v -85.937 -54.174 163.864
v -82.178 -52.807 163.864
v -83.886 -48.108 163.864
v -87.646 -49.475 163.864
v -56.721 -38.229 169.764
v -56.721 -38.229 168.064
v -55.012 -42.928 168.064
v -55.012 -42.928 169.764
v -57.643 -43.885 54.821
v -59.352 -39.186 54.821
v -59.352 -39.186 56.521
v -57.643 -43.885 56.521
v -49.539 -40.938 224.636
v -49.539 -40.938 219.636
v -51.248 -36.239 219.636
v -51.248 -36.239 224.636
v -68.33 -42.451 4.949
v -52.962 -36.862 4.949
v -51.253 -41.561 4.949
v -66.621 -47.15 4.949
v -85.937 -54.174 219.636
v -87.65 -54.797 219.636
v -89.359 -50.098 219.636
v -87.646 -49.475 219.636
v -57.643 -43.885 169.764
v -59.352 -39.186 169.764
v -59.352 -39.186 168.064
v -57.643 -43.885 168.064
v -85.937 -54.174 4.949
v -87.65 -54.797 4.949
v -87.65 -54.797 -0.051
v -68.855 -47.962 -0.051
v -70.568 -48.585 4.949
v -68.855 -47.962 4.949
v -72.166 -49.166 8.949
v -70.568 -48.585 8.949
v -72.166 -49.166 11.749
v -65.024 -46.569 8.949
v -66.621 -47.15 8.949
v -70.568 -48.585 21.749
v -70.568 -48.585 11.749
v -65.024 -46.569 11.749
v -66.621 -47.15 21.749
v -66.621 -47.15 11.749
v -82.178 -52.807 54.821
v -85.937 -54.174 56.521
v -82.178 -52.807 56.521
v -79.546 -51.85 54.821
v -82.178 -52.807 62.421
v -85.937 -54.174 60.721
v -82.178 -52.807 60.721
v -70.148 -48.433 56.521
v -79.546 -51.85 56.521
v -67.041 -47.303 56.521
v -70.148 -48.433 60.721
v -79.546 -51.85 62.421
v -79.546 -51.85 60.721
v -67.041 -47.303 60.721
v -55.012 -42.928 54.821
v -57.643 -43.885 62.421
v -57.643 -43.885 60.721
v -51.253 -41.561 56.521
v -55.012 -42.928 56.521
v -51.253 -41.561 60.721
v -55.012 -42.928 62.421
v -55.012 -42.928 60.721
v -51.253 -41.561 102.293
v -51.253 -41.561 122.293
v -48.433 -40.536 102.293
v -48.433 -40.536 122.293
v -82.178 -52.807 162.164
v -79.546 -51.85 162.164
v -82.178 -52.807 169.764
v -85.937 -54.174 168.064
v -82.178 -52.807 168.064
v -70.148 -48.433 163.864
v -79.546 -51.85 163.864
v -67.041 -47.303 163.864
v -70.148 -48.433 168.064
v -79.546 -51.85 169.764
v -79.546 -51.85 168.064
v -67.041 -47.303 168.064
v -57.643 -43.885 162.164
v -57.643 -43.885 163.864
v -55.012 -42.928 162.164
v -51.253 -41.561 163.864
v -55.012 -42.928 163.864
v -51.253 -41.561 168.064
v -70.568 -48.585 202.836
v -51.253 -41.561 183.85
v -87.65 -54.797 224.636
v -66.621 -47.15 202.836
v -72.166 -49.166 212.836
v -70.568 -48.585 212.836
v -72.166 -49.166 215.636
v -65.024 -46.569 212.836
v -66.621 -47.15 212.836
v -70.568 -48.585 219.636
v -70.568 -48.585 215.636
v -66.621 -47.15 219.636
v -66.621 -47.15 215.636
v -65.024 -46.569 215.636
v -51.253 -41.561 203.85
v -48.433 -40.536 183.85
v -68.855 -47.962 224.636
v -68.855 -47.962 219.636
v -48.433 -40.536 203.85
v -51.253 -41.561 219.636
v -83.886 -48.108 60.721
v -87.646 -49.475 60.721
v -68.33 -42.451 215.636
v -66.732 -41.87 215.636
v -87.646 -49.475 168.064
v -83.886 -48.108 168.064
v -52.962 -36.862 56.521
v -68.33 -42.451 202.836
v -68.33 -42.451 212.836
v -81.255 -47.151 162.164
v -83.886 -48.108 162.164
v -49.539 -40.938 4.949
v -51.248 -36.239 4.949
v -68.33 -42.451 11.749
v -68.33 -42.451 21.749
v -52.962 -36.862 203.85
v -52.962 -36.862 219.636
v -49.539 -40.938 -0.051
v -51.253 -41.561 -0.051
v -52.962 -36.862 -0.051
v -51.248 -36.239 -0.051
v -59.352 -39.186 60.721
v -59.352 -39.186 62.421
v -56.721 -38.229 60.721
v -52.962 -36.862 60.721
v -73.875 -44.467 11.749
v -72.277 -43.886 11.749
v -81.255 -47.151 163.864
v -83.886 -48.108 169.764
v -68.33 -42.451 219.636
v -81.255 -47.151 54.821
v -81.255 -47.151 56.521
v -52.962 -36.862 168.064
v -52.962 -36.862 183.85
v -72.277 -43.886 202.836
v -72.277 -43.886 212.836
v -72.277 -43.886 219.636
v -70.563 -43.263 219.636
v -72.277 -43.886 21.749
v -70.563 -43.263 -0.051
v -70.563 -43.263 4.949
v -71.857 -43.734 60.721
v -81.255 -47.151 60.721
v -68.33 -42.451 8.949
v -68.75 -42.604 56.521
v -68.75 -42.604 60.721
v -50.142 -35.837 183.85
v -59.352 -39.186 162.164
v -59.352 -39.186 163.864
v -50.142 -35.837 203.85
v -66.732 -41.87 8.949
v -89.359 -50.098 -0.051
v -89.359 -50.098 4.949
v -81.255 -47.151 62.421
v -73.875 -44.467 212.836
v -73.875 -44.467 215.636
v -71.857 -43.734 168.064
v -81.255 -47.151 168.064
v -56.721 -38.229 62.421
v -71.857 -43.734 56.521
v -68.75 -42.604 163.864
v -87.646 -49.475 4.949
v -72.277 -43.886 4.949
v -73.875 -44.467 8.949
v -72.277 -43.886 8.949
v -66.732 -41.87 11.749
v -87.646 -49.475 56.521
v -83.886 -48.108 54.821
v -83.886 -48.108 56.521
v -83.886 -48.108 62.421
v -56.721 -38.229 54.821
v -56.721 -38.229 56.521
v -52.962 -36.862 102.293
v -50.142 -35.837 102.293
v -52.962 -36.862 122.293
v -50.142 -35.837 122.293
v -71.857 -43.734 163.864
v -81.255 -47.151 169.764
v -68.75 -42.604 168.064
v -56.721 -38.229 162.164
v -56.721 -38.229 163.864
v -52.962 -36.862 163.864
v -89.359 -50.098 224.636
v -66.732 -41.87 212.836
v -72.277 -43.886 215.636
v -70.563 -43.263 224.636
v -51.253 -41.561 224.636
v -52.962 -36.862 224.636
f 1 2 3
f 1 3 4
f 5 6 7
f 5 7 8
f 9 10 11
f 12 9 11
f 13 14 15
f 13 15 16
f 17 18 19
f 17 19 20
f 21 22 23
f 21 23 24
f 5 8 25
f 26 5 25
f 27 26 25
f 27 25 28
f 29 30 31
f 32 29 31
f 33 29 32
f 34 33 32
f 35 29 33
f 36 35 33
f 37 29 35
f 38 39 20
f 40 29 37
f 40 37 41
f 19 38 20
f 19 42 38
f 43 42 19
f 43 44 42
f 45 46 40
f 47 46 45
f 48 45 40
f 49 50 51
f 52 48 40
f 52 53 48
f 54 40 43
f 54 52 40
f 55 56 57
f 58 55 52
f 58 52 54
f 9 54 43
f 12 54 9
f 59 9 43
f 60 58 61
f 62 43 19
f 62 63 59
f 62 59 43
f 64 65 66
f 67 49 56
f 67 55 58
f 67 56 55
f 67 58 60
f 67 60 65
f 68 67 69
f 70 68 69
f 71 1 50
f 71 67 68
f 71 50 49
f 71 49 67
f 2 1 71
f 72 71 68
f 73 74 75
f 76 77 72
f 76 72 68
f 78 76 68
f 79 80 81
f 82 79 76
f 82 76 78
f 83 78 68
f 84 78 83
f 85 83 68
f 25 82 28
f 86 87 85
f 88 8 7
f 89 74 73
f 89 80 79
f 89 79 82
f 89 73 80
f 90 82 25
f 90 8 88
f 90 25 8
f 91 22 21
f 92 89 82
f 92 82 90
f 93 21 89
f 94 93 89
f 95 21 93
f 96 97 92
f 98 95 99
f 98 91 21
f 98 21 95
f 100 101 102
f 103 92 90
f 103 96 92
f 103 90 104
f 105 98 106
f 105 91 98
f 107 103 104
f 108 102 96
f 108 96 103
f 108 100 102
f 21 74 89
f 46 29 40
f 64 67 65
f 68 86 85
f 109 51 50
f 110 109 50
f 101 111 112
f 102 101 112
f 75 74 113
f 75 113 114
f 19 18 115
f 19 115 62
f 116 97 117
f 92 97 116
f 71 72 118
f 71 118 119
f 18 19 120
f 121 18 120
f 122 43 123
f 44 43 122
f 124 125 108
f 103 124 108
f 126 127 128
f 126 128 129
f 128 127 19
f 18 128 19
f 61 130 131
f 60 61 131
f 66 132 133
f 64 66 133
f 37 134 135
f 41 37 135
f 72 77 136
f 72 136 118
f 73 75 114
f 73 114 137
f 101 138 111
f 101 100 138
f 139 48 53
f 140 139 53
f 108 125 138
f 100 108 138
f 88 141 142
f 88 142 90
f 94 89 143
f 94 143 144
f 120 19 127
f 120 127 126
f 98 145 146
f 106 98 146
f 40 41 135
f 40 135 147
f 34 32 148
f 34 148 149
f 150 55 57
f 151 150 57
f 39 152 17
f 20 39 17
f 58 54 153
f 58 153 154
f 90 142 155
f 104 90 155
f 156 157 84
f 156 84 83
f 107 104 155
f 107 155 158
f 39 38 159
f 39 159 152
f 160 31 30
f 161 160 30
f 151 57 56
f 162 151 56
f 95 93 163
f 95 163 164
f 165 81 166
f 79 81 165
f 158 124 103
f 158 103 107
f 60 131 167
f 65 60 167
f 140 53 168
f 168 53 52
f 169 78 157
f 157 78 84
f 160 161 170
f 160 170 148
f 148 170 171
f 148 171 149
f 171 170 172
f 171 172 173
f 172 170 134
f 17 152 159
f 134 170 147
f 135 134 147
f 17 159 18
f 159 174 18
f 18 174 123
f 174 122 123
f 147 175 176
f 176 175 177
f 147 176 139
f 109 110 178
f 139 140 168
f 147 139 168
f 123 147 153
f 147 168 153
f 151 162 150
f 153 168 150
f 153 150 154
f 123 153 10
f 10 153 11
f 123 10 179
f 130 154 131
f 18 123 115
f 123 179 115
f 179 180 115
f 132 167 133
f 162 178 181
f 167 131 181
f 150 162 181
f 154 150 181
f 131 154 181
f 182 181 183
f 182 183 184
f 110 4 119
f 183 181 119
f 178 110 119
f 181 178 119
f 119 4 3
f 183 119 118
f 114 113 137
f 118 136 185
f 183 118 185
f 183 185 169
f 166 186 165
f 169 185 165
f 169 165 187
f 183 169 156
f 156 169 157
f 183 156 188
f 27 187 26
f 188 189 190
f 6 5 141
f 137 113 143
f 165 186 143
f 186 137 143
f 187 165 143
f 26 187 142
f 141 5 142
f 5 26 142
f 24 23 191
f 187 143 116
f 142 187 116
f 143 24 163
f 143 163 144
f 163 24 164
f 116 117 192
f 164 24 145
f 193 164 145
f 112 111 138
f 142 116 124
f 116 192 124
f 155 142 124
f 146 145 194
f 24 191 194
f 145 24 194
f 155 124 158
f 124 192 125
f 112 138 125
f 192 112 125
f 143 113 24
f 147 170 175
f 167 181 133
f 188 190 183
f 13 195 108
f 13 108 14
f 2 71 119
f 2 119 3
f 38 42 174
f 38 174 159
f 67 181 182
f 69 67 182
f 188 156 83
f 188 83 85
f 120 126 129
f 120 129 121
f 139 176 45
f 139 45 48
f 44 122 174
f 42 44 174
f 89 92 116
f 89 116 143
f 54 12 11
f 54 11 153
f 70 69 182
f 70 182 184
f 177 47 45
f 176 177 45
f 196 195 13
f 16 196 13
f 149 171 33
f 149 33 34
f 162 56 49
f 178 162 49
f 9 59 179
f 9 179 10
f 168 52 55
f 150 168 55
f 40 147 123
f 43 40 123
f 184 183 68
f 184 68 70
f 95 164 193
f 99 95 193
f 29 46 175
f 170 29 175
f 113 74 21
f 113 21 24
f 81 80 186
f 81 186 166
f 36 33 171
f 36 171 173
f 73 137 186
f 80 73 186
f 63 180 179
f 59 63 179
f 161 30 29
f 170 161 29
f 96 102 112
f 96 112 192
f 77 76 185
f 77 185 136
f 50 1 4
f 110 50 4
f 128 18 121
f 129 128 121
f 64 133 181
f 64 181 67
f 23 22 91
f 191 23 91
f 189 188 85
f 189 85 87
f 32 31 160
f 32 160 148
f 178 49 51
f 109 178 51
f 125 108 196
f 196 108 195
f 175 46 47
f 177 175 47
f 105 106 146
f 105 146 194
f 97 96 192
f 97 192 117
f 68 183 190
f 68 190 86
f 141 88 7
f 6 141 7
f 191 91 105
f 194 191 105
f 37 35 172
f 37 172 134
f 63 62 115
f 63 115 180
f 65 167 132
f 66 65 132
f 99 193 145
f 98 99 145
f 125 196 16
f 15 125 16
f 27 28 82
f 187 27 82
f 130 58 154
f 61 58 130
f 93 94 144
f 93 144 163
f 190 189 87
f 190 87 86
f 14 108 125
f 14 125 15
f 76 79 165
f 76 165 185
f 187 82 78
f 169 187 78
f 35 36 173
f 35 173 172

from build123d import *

# Parameters (mm, degrees)
BOSS_EXTRUDE1_DEPTH = 214.686455
CUT_EXTRUDE3_DEPTH  = 17.853621588
SKETCH5_W           = 20
SKETCH5_H           = 5
SKETCH5_W_2         = 1.823440518
SKETCH5_W_3         = 3
SKETCH5_H_2         = 20
BOSS_EXTRUDE2_DEPTH = 5


with BuildPart() as part:
    # Sketch2 → Boss-Extrude1 (new body)
    with BuildSketch(Plane.XY.offset(4.949356739)):
        Polygon((-52.961538618, -36.862052104), (-51.252736373, -41.56098761), (-85.936742732, -54.174080058), (-87.645544977, -49.475144552), align=None)
    extrude(amount=BOSS_EXTRUDE1_DEPTH)

    # Sketch4 → Cut-Extrude3 (cut, through all)
    with BuildSketch(Plane(origin=(7.362313595, -20.245196221, 0), x_dir=(-0.939787101, -0.341760449, 0), z_dir=(0.341760449, -0.939787101, 0))):
        Polygon((78.723681295, -4.949356739), (82.923681295, -4.949356739), (82.923681295, -8.949356739), (84.623681295, -8.949356739), (84.623681295, -11.749356739), (82.923681295, -11.749356739), (82.923681295, -21.749356739), (78.723681295, -21.749356739), (78.723681295, -11.749356739), (77.023681295, -11.749356739), (77.023681295, -8.949356739), (78.723681295, -8.949356739), align=None)
        Polygon((62.37056233, -60.720970532), (62.37056233, -56.520970532), (66.37056233, -56.520970532), (66.37056233, -54.820970532), (69.17056233, -54.820970532), (69.17056233, -56.520970532), (79.17056233, -56.520970532), (79.17056233, -60.720970532), (69.17056233, -60.720970532), (69.17056233, -62.420970532), (66.37056233, -62.420970532), (66.37056233, -60.720970532), align=None)
        Polygon((82.923681295, -219.635811913), (78.723681295, -219.635811913), (78.723681295, -215.635811913), (77.023681295, -215.635811913), (77.023681295, -212.835811913), (78.723681295, -212.835811913), (78.723681295, -202.835811913), (82.923681295, -202.835811913), (82.923681295, -212.835811913), (84.623681295, -212.835811913), (84.623681295, -215.635811913), (82.923681295, -215.635811913), align=None)
        Polygon((66.37056233, -168.064198119), (66.37056233, -169.764198119), (69.17056233, -169.764198119), (69.17056233, -168.064198119), (79.17056233, -168.064198119), (79.17056233, -163.864198119), (69.17056233, -163.864198119), (69.17056233, -162.164198119), (66.37056233, -162.164198119), (66.37056233, -163.864198119), (62.37056233, -163.864198119), (62.37056233, -168.064198119), align=None)
        Polygon((99.276800261, -163.864198119), (99.276800261, -168.064198119), (95.276800261, -168.064198119), (95.276800261, -169.764198119), (92.476800261, -169.764198119), (92.476800261, -168.064198119), (82.476800261, -168.064198119), (82.476800261, -163.864198119), (92.476800261, -163.864198119), (92.476800261, -162.164198119), (95.276800261, -162.164198119), (95.276800261, -163.864198119), align=None)
        Polygon((95.276800261, -56.520970532), (95.276800261, -54.820970532), (92.476800261, -54.820970532), (92.476800261, -56.520970532), (82.476800261, -56.520970532), (82.476800261, -60.720970532), (92.476800261, -60.720970532), (92.476800261, -62.420970532), (95.276800261, -62.420970532), (95.276800261, -60.720970532), (99.276800261, -60.720970532), (99.276800261, -56.520970532), align=None)
    extrude(amount=-CUT_EXTRUDE3_DEPTH, mode=Mode.SUBTRACT)

    # Sketch5 → Boss-Extrude2 (add)
    with BuildSketch(Plane(origin=(7.362313595, -20.245196221, 0), x_dir=(0.939787101, 0.341760449, 0), z_dir=(0.341760449, -0.939787101, 0))):
        with Locations((-91.100240778, 222.135811913)):
            Rectangle(SKETCH5_W, SKETCH5_H)
        with Locations((-61.458842071, 2.449356739)):
            Rectangle(SKETCH5_W_2, SKETCH5_H)
        with Locations((-60.87056233, 112.292584326)):
            Rectangle(SKETCH5_W_3, SKETCH5_H_2)
        with Locations((-60.87056233, 193.850005016)):
            Rectangle(SKETCH5_W_3, SKETCH5_H_2)
        with Locations((-61.458842071, 222.135811913)):
            Rectangle(SKETCH5_W_2, SKETCH5_H)
        with Locations((-91.100240778, 2.449356739)):
            Rectangle(SKETCH5_W, SKETCH5_H)
    extrude(amount=-BOSS_EXTRUDE2_DEPTH)


solid = part.part
